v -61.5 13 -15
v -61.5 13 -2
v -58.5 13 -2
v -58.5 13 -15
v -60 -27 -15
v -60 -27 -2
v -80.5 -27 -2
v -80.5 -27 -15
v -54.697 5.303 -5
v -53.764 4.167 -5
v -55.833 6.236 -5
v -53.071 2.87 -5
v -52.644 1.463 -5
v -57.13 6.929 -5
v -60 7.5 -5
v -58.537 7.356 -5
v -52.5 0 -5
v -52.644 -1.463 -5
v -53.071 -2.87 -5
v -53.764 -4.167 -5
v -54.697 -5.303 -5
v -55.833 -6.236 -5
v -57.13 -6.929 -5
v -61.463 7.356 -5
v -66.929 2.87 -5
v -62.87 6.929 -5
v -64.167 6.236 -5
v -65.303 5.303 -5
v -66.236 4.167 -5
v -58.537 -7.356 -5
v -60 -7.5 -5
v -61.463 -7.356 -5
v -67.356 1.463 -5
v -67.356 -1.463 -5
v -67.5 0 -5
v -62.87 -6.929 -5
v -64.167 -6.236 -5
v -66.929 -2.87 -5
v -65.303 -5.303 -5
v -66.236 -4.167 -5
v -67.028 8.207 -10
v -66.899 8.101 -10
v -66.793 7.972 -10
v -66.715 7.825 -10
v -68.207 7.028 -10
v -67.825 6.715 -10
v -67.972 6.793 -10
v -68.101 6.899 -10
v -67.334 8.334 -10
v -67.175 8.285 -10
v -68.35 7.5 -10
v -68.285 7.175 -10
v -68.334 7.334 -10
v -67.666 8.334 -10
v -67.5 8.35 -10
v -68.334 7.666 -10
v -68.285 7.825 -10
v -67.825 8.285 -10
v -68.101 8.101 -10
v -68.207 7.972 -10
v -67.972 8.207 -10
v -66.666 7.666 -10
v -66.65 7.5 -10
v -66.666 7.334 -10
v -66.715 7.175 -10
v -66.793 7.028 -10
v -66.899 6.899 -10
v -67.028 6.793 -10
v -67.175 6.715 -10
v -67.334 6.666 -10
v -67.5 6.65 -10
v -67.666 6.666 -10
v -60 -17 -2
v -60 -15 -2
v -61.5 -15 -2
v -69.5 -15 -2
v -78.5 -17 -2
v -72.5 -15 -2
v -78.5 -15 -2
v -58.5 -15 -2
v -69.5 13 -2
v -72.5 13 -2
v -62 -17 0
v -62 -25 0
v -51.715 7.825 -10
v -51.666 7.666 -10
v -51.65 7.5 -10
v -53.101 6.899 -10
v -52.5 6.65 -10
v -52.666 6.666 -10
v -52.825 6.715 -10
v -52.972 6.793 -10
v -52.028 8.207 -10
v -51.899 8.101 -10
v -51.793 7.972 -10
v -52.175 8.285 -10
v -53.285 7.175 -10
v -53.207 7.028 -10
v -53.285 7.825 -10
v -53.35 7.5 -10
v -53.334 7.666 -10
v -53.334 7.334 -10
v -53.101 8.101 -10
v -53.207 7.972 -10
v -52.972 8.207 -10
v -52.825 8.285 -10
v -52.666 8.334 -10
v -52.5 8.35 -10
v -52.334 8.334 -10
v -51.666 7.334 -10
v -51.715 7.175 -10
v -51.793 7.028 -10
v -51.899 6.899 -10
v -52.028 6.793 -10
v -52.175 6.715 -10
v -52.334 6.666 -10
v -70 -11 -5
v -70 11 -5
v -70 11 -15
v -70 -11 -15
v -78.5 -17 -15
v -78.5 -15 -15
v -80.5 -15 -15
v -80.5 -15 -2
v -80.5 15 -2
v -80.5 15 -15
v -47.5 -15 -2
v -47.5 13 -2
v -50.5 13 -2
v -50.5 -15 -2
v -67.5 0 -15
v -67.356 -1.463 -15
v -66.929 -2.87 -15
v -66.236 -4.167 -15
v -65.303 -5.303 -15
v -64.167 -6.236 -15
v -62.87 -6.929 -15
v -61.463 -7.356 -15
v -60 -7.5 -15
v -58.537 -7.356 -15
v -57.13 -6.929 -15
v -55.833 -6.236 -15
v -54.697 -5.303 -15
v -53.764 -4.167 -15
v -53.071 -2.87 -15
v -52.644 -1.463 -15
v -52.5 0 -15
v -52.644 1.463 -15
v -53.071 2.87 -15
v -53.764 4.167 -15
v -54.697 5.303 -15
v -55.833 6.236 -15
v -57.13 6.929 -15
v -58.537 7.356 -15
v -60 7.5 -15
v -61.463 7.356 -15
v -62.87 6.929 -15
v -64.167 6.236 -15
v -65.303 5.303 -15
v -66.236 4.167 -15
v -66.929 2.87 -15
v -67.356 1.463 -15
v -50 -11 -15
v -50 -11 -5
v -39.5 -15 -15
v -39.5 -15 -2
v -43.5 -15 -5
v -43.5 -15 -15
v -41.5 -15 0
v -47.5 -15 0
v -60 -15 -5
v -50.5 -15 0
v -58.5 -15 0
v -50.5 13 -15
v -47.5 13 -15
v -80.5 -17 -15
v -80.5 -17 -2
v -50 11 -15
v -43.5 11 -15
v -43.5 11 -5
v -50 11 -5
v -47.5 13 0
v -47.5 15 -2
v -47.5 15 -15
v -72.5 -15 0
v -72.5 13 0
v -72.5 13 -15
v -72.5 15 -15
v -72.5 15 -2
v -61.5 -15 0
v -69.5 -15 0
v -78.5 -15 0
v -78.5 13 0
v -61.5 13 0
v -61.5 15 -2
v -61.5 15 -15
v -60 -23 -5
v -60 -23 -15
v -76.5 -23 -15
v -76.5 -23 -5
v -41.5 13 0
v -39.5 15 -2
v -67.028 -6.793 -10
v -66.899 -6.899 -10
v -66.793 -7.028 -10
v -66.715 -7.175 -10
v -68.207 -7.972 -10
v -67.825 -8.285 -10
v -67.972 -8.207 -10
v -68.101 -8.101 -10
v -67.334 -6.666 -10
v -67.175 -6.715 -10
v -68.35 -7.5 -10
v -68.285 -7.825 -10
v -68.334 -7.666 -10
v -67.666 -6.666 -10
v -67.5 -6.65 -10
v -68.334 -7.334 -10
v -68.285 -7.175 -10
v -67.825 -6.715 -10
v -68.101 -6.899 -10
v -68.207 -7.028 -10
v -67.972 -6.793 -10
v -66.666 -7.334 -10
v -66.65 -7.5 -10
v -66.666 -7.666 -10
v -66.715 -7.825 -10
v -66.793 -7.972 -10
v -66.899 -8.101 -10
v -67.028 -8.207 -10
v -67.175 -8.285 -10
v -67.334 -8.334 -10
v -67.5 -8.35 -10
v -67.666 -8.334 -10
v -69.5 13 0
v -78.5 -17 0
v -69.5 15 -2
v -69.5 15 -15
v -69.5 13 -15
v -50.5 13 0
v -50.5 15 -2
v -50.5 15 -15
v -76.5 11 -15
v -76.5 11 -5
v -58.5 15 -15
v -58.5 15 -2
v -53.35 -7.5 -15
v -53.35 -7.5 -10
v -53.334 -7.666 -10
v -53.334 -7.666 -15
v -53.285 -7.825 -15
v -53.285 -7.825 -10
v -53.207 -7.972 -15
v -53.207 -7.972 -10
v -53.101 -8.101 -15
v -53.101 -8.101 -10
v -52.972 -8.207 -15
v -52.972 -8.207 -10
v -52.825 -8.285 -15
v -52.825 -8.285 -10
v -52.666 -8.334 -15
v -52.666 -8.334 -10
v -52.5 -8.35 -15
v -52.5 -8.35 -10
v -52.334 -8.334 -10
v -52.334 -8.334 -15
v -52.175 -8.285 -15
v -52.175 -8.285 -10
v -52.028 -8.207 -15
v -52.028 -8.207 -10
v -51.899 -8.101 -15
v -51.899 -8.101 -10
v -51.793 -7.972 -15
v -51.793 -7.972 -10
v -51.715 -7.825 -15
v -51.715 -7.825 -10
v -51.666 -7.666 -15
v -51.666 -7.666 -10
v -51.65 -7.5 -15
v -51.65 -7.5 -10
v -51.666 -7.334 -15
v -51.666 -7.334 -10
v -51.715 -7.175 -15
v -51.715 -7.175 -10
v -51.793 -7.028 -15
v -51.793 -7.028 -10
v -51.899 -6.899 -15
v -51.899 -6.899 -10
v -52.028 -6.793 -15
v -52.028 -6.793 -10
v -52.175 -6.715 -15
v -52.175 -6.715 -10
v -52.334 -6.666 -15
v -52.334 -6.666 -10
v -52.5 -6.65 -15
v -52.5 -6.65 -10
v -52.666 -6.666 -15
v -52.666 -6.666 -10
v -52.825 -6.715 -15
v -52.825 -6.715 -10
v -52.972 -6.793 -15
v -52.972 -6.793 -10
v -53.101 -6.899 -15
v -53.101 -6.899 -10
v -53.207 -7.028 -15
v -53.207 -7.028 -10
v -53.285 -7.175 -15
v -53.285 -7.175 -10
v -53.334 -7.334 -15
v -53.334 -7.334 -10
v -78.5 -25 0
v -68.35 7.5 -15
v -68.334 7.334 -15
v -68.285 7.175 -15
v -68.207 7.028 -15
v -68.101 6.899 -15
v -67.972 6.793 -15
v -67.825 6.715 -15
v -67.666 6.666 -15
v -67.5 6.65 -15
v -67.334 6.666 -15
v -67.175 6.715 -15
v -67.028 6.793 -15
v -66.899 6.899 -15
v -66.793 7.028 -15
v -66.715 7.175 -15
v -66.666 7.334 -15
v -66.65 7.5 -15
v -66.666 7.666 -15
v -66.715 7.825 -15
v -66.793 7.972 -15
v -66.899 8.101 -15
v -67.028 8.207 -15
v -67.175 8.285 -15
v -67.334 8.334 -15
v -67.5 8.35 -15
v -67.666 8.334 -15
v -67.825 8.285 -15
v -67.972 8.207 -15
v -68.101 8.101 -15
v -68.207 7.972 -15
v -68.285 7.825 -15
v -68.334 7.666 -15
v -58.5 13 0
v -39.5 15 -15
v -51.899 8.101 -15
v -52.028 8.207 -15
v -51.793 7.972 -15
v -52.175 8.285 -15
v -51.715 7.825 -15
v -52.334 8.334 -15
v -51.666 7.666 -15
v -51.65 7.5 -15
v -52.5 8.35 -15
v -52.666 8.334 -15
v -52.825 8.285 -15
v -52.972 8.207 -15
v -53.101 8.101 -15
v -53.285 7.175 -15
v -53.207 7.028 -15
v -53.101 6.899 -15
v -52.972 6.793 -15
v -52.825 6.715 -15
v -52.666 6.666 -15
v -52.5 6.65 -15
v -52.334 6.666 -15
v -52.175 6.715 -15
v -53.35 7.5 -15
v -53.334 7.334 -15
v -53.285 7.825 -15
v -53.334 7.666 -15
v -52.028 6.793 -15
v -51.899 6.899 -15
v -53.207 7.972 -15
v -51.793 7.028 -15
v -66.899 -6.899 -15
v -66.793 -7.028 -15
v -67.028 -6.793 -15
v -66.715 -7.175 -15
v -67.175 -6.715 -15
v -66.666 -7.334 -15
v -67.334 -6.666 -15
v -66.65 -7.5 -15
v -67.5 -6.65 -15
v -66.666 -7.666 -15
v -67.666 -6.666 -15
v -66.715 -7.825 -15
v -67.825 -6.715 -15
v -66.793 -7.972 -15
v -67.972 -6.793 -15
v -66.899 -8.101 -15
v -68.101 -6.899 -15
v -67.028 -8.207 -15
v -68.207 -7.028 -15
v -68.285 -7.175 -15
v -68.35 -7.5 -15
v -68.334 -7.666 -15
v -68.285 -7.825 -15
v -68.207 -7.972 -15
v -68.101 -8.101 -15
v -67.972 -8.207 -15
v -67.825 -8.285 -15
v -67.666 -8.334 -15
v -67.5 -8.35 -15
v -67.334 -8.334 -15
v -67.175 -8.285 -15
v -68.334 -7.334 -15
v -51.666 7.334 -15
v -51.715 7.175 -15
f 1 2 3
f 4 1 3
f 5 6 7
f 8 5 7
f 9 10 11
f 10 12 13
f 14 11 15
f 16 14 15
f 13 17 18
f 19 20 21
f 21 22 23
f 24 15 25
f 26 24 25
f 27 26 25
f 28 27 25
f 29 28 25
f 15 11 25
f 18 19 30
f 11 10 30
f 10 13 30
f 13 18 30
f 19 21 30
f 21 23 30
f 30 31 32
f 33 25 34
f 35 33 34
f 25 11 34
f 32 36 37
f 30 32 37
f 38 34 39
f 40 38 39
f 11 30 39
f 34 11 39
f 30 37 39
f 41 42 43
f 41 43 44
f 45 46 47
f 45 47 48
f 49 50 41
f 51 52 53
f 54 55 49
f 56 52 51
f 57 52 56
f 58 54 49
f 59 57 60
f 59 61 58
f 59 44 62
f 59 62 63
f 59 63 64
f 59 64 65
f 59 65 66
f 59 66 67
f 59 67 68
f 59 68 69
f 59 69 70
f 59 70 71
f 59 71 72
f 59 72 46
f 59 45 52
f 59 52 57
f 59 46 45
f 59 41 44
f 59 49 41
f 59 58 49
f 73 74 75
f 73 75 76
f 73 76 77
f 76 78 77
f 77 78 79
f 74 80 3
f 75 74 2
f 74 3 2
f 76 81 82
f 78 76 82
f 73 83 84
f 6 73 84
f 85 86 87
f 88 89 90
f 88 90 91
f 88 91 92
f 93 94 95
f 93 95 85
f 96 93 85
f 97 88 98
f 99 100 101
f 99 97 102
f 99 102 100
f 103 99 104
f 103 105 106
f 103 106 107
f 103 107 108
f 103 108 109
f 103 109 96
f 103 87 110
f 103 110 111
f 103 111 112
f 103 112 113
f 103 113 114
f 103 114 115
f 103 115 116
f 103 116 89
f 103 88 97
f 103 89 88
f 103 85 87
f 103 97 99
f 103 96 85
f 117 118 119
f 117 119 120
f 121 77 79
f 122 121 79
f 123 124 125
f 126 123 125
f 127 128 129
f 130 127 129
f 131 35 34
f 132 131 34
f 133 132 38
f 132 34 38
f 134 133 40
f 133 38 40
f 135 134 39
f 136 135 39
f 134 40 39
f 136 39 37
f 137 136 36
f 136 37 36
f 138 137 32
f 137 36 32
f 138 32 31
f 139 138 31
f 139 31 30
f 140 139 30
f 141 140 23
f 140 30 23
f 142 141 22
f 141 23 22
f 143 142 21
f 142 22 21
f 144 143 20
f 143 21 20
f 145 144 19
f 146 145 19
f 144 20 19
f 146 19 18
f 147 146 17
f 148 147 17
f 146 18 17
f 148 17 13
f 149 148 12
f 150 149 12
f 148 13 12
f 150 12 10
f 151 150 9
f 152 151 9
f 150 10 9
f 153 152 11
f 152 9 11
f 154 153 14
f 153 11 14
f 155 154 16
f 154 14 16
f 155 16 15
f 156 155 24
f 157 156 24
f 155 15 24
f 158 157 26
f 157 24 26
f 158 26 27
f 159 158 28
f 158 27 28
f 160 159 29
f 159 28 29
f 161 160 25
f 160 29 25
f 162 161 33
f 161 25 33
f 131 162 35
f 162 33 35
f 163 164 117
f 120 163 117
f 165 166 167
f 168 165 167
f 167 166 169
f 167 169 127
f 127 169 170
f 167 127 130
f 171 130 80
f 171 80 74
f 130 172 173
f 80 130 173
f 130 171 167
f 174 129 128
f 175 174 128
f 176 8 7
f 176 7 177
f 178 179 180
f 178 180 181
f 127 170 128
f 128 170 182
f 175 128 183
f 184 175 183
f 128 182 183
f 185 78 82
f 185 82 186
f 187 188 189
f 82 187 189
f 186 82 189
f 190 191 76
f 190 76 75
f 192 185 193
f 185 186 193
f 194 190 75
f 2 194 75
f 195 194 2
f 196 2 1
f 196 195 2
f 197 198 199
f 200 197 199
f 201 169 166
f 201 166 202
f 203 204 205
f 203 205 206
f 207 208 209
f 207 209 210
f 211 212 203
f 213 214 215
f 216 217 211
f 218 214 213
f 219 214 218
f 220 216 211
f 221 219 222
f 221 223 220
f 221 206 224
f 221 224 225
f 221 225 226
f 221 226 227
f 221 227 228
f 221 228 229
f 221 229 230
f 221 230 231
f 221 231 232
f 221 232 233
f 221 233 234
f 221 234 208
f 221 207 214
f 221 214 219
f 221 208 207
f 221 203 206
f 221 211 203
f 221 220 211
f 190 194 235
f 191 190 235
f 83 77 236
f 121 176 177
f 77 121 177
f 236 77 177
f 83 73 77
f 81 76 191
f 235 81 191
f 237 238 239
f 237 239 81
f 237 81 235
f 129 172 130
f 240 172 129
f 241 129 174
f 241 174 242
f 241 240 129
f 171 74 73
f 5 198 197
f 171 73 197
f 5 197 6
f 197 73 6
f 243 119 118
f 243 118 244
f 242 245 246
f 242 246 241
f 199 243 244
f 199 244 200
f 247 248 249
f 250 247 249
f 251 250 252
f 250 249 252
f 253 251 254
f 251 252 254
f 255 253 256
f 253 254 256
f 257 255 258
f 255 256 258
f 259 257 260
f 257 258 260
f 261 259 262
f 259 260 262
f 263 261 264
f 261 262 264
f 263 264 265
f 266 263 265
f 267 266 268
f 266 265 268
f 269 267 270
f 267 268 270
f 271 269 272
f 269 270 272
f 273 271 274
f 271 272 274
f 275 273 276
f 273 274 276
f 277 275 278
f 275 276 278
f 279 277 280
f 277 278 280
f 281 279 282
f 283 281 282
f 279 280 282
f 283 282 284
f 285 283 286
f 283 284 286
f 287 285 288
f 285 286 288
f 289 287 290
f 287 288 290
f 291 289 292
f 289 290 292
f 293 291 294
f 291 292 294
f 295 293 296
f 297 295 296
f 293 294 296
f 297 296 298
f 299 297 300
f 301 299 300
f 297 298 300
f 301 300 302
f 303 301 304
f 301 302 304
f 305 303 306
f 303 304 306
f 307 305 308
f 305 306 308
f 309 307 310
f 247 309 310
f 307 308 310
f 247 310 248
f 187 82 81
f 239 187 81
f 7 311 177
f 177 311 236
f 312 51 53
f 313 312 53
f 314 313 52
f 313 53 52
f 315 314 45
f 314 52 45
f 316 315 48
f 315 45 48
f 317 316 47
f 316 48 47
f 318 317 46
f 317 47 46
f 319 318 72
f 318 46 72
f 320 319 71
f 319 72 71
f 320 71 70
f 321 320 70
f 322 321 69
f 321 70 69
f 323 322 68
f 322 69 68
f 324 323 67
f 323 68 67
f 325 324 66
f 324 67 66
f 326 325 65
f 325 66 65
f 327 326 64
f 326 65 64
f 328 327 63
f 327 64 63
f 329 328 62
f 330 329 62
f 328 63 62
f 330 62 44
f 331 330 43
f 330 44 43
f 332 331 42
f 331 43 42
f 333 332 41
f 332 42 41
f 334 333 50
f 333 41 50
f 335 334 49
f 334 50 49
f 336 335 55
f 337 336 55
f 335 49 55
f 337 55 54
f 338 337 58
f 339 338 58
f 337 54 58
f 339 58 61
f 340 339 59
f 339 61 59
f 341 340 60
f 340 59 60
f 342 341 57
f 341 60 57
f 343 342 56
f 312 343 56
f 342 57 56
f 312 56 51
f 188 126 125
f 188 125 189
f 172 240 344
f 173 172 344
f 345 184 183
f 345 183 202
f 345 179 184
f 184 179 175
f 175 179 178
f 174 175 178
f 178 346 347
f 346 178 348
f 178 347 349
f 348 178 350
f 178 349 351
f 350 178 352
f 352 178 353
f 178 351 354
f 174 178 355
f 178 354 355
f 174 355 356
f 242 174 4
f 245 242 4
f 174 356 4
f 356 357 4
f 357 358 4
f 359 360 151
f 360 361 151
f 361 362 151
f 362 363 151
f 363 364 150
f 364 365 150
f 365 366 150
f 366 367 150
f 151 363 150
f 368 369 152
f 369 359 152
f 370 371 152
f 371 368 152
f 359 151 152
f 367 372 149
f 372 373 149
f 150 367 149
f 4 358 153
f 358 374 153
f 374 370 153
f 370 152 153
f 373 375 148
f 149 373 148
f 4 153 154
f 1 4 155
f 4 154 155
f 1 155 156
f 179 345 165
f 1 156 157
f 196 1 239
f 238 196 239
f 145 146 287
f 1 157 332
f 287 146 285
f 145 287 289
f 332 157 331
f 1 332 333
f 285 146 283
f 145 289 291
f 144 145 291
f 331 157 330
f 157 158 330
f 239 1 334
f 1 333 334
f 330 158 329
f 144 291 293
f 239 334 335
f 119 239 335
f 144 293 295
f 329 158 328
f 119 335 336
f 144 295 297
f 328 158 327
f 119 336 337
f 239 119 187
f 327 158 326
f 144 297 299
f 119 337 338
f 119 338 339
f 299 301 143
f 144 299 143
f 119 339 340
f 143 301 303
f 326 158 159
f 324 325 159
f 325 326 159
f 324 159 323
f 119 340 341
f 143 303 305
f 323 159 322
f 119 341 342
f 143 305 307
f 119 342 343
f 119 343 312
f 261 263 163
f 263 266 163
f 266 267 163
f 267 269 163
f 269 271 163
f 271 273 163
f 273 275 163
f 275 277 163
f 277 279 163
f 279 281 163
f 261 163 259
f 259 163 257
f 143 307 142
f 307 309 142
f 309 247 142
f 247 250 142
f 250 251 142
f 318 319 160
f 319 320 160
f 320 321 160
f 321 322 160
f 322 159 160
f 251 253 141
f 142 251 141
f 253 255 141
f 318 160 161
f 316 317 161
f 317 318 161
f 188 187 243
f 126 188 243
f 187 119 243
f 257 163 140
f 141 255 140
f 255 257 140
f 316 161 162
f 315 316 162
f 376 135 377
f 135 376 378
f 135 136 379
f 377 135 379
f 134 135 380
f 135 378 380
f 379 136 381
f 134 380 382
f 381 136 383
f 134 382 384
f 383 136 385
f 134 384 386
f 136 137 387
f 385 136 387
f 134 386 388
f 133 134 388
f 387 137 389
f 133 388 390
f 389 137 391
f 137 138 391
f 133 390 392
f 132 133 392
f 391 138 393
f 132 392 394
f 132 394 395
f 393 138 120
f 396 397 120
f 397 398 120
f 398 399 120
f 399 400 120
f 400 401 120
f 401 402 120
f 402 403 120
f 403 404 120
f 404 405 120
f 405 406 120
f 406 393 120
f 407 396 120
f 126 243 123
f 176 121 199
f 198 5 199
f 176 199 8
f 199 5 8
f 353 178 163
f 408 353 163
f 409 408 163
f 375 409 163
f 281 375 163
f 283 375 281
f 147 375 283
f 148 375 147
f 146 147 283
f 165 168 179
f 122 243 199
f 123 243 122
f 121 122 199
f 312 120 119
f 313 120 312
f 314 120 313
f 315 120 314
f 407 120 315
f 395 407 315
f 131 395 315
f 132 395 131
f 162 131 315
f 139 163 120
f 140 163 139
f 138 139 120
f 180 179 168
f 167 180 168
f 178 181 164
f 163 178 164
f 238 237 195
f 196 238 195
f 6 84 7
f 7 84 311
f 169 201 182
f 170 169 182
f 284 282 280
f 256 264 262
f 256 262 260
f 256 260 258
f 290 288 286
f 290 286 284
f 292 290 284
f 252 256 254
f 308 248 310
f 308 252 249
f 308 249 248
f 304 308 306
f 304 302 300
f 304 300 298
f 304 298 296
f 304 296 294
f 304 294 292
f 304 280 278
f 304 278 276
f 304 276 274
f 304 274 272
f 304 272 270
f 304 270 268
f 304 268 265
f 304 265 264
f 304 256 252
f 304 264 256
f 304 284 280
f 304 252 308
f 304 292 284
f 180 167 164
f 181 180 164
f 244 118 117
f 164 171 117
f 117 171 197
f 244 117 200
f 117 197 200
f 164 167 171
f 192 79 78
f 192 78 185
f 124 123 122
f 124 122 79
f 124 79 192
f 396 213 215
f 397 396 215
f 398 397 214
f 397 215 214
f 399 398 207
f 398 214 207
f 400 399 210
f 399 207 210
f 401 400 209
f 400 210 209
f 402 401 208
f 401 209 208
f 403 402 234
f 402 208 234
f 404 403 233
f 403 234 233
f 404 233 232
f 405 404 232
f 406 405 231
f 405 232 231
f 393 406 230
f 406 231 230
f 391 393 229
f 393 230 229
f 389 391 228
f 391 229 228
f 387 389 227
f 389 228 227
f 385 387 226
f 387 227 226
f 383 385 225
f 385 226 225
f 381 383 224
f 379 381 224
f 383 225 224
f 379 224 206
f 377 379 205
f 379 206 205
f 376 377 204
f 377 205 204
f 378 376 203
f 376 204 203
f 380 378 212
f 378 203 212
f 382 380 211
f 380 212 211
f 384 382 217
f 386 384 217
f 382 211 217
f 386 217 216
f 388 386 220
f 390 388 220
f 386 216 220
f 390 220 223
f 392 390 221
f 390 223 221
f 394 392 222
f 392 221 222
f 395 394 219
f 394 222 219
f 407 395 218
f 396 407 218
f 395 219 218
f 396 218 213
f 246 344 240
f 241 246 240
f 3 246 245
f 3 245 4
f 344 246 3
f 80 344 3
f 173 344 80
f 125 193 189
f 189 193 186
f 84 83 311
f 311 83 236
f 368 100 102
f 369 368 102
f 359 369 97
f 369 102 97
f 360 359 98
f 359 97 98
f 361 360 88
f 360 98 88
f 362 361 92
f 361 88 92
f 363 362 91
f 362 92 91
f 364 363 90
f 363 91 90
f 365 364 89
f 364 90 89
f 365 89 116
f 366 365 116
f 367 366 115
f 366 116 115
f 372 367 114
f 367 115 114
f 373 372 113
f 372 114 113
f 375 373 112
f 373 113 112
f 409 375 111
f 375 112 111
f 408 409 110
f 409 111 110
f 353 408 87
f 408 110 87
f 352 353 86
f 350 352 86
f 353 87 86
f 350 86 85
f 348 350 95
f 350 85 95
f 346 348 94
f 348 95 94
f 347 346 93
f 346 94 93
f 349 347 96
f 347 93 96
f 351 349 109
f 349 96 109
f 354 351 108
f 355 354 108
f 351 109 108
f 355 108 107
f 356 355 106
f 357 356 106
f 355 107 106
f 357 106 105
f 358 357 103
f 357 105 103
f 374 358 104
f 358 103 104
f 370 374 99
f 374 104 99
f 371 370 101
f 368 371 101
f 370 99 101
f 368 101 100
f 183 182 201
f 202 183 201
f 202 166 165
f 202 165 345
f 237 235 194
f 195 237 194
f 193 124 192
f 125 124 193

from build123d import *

# Parameters (mm, degrees)
F0_W      = 8
F0_H      = 30
F0_W_2    = 3
F0_W_3    = 20.5
F0_H_2    = 10
F1_DEPTH  = 15
F2_DEPTH  = 2
F3_SIZE   = 2
F4_R      = 0.85
F5_DEPTH  = 15.001
F6_R      = 1
F6_R_2    = 7.5
F7_DEPTH  = 1.5
F8_W      = 3
F8_H      = 13
F9_DEPTH  = 2
F10_W     = 2
F10_H     = 13
F11_DEPTH = 2
F12_ANGLE = 90
F13_R     = 0.85
F14_DEPTH = 1.5
F15_W     = 33
F15_H     = 34
F16_DEPTH = 10
F17_W     = 20
F17_H     = 22
F17_R     = 0.85
F17_R_2   = 7.5
F18_DEPTH = 10
F19_R     = 0.85
F20_DEPTH = 10


with BuildPart() as f1:
    # F0 (on Top) → F1 (new body)
    with BuildSketch(Plane.XY):
        with Locations((-16.5, 0)):
            Rectangle(F0_W, F0_H)
        with Locations((-11, 0)):
            Rectangle(F0_W_2, F0_H)
        with Locations((-5.5, 0)):
            Rectangle(F0_W, F0_H)
        Polygon((1.5, 15), (-1.5, 15), (-1.5, -15), (0, -15), (1.5, -15), align=None)
        with Locations((5.5, 0)):
            Rectangle(F0_W, F0_H)
        with Locations((11, 0)):
            Rectangle(F0_W_2, F0_H)
        Polygon((9.5, -15), (1.5, -15), (0, -15), (0, -17), (20.5, -17), (20.5, -15), (12.5, -15), align=None)
        with Locations((16.5, 0)):
            Rectangle(F0_W, F0_H)
        with Locations((10.25, -22)):
            Rectangle(F0_W_3, F0_H_2)
    extrude(amount=-F1_DEPTH)

    # F0 (on Top) → F2 (cut)
    with BuildSketch(Plane.XY):
        with Locations((-11, 0)):
            Rectangle(F0_W_2, F0_H)
        Polygon((1.5, 15), (-1.5, 15), (-1.5, -15), (0, -15), (1.5, -15), align=None)
        with Locations((11, 0)):
            Rectangle(F0_W_2, F0_H)
        Polygon((9.5, -15), (1.5, -15), (0, -15), (0, -17), (20.5, -17), (20.5, -15), (12.5, -15), align=None)
    extrude(amount=-F2_DEPTH, mode=Mode.SUBTRACT)

    # F3
    f3_edges = [f1.edges().sort_by_distance(p)[0] for p in [
        (-16.5, 15, 0),
        (-20.5, 0, 0),
        (20.5, 0, 0),
        (16.5, 15, 0),
        (5.5, 15, 0),
        (-5.5, 15, 0),
        (10.25, -27, 0),
        (20.5, -22, 0),
        (0, -22, 0),
    ]]
    chamfer(f3_edges, length=F3_SIZE)

    # F4 (on face) → F5 (cut, through all)
    with BuildSketch(Plane.XY):
        with Locations((-7.5, 7.5)):
            Circle(F4_R)
        with Locations((7.5, 7.5)):
            Circle(F4_R)
        with Locations((7.5, -7.5)):
            Circle(F4_R)
        with Locations((-7.5, -7.5)):
            Circle(F4_R)
    extrude(amount=-F5_DEPTH, mode=Mode.SUBTRACT)

    # F8 (on face) → F9 (cut)
    with BuildSketch(Plane(origin=(0, 15, 0), x_dir=(-1, 0, 0), z_dir=(0, 1, 0))):
        with Locations((11, -8.5)):
            Rectangle(F8_W, F8_H)
        Polygon((1.5, -15), (1.5, -2), (0, -2), (-1.5, -2), (-1.5, -15), (0, -15), align=None)
        with Locations((-11, -8.5)):
            Rectangle(F8_W, F8_H)
    extrude(amount=-F9_DEPTH, mode=Mode.SUBTRACT)

    # F10 (on face) → F11 (cut)
    with BuildSketch(Plane.YZ.offset(20.5)):
        with Locations((-16, -8.5)):
            Rectangle(F10_W, F10_H)
    extrude(amount=-F11_DEPTH, mode=Mode.SUBTRACT)

    # F15 (on face) → F16 (cut)
    with BuildSketch(Plane(origin=(0, 0, -15), x_dir=(1, 0, 0), z_dir=(0, 0, -1))):
        with Locations((0, 6)):
            Rectangle(F15_W, F15_H)
    extrude(amount=-F16_DEPTH, mode=Mode.SUBTRACT)



with BuildPart() as f7:
    # F6 (on face) → F7 (new body)
    with BuildSketch(Plane(origin=(0, 0, -15), x_dir=(1, 0, 0), z_dir=(0, 0, -1))):
        with BuildLine():
            ThreePointArc((10, 14.5), (9.5606601718, 15.5606601718), (8.5, 16))
            Line((8.5, 16), (-8.5, 16))
            ThreePointArc((-8.5, 16), (-9.5606601718, 15.5606601718), (-10, 14.5))
            Line((-10, 14.5), (-10, -14.5))
            ThreePointArc((-10, -14.5), (-9.5606601718, -15.5606601718), (-8.5, -16))
            Line((-8.5, -16), (8.5, -16))
            ThreePointArc((8.5, -16), (9.5606601718, -15.5606601718), (10, -14.5))
            Line((10, -14.5), (10, 14.5))
        make_face()
        with Locations((-7.5, -13.5)):
            Circle(F6_R, mode=Mode.SUBTRACT)
        with Locations((0, -13.5)):
            Circle(F6_R, mode=Mode.SUBTRACT)
        with Locations((7.5, -13.5)):
            Circle(F6_R, mode=Mode.SUBTRACT)
        with Locations((-7.5, 13.5)):
            Circle(F6_R, mode=Mode.SUBTRACT)
        Circle(F6_R_2, mode=Mode.SUBTRACT)
        with Locations((0, 13.5)):
            Circle(F6_R, mode=Mode.SUBTRACT)
        with Locations((7.5, 13.5)):
            Circle(F6_R, mode=Mode.SUBTRACT)
    extrude(amount=F7_DEPTH)


with BuildPart() as f7_1:
    # F12: moved
    add(f7.part.rotate(Axis((0, 0, -15), (0, 0, -1)), F12_ANGLE))

    # F13 (on face) → F14 (cut, through all)
    with BuildSketch(Plane(origin=(0, 0, -16.5), x_dir=(1, 0, 0), z_dir=(0, 0, -1))):
        with Locations((-7.5, -7.5)):
            Circle(F13_R)
        with Locations((7.5, -7.5)):
            Circle(F13_R)
        with Locations((-7.5, 7.5)):
            Circle(F13_R)
        with Locations((7.5, 7.5)):
            Circle(F13_R)
    extrude(amount=-F14_DEPTH, mode=Mode.SUBTRACT)


with BuildPart() as f18:
    # F17 (on face) → F18 (new body, through all)
    with BuildSketch(Plane(origin=(0, 0, -5), x_dir=(1, 0, 0), z_dir=(0, 0, -1))):
        Rectangle(F17_W, F17_H)
        with Locations((-7.5, -7.5)):
            Circle(F17_R, mode=Mode.SUBTRACT)
        with Locations((7.5, -7.5)):
            Circle(F17_R, mode=Mode.SUBTRACT)
        with Locations((-7.5, 7.5)):
            Circle(F17_R, mode=Mode.SUBTRACT)
        Circle(F17_R_2, mode=Mode.SUBTRACT)
        with Locations((7.5, 7.5)):
            Circle(F17_R, mode=Mode.SUBTRACT)
    extrude(amount=F18_DEPTH)


with BuildPart() as f1_1:
    add(f1.part)

    add(f18.part)  # F20 merges F18
    # F19 (on face) → F20 (join)
    with BuildSketch(Plane.XY):
        with Locations((7.5, 7.5)):
            Circle(F19_R)
        with Locations((-7.5, 7.5)):
            Circle(F19_R)
        with Locations((-7.5, -7.5)):
            Circle(F19_R)
        with Locations((7.5, -7.5)):
            Circle(F19_R)
    extrude(amount=-F20_DEPTH)


with BuildPart() as f22_1:
    # F22: instance of F1
    add(f1_1.part.mirror(Plane.YZ.offset(-30)))


solid = f22_1.part
